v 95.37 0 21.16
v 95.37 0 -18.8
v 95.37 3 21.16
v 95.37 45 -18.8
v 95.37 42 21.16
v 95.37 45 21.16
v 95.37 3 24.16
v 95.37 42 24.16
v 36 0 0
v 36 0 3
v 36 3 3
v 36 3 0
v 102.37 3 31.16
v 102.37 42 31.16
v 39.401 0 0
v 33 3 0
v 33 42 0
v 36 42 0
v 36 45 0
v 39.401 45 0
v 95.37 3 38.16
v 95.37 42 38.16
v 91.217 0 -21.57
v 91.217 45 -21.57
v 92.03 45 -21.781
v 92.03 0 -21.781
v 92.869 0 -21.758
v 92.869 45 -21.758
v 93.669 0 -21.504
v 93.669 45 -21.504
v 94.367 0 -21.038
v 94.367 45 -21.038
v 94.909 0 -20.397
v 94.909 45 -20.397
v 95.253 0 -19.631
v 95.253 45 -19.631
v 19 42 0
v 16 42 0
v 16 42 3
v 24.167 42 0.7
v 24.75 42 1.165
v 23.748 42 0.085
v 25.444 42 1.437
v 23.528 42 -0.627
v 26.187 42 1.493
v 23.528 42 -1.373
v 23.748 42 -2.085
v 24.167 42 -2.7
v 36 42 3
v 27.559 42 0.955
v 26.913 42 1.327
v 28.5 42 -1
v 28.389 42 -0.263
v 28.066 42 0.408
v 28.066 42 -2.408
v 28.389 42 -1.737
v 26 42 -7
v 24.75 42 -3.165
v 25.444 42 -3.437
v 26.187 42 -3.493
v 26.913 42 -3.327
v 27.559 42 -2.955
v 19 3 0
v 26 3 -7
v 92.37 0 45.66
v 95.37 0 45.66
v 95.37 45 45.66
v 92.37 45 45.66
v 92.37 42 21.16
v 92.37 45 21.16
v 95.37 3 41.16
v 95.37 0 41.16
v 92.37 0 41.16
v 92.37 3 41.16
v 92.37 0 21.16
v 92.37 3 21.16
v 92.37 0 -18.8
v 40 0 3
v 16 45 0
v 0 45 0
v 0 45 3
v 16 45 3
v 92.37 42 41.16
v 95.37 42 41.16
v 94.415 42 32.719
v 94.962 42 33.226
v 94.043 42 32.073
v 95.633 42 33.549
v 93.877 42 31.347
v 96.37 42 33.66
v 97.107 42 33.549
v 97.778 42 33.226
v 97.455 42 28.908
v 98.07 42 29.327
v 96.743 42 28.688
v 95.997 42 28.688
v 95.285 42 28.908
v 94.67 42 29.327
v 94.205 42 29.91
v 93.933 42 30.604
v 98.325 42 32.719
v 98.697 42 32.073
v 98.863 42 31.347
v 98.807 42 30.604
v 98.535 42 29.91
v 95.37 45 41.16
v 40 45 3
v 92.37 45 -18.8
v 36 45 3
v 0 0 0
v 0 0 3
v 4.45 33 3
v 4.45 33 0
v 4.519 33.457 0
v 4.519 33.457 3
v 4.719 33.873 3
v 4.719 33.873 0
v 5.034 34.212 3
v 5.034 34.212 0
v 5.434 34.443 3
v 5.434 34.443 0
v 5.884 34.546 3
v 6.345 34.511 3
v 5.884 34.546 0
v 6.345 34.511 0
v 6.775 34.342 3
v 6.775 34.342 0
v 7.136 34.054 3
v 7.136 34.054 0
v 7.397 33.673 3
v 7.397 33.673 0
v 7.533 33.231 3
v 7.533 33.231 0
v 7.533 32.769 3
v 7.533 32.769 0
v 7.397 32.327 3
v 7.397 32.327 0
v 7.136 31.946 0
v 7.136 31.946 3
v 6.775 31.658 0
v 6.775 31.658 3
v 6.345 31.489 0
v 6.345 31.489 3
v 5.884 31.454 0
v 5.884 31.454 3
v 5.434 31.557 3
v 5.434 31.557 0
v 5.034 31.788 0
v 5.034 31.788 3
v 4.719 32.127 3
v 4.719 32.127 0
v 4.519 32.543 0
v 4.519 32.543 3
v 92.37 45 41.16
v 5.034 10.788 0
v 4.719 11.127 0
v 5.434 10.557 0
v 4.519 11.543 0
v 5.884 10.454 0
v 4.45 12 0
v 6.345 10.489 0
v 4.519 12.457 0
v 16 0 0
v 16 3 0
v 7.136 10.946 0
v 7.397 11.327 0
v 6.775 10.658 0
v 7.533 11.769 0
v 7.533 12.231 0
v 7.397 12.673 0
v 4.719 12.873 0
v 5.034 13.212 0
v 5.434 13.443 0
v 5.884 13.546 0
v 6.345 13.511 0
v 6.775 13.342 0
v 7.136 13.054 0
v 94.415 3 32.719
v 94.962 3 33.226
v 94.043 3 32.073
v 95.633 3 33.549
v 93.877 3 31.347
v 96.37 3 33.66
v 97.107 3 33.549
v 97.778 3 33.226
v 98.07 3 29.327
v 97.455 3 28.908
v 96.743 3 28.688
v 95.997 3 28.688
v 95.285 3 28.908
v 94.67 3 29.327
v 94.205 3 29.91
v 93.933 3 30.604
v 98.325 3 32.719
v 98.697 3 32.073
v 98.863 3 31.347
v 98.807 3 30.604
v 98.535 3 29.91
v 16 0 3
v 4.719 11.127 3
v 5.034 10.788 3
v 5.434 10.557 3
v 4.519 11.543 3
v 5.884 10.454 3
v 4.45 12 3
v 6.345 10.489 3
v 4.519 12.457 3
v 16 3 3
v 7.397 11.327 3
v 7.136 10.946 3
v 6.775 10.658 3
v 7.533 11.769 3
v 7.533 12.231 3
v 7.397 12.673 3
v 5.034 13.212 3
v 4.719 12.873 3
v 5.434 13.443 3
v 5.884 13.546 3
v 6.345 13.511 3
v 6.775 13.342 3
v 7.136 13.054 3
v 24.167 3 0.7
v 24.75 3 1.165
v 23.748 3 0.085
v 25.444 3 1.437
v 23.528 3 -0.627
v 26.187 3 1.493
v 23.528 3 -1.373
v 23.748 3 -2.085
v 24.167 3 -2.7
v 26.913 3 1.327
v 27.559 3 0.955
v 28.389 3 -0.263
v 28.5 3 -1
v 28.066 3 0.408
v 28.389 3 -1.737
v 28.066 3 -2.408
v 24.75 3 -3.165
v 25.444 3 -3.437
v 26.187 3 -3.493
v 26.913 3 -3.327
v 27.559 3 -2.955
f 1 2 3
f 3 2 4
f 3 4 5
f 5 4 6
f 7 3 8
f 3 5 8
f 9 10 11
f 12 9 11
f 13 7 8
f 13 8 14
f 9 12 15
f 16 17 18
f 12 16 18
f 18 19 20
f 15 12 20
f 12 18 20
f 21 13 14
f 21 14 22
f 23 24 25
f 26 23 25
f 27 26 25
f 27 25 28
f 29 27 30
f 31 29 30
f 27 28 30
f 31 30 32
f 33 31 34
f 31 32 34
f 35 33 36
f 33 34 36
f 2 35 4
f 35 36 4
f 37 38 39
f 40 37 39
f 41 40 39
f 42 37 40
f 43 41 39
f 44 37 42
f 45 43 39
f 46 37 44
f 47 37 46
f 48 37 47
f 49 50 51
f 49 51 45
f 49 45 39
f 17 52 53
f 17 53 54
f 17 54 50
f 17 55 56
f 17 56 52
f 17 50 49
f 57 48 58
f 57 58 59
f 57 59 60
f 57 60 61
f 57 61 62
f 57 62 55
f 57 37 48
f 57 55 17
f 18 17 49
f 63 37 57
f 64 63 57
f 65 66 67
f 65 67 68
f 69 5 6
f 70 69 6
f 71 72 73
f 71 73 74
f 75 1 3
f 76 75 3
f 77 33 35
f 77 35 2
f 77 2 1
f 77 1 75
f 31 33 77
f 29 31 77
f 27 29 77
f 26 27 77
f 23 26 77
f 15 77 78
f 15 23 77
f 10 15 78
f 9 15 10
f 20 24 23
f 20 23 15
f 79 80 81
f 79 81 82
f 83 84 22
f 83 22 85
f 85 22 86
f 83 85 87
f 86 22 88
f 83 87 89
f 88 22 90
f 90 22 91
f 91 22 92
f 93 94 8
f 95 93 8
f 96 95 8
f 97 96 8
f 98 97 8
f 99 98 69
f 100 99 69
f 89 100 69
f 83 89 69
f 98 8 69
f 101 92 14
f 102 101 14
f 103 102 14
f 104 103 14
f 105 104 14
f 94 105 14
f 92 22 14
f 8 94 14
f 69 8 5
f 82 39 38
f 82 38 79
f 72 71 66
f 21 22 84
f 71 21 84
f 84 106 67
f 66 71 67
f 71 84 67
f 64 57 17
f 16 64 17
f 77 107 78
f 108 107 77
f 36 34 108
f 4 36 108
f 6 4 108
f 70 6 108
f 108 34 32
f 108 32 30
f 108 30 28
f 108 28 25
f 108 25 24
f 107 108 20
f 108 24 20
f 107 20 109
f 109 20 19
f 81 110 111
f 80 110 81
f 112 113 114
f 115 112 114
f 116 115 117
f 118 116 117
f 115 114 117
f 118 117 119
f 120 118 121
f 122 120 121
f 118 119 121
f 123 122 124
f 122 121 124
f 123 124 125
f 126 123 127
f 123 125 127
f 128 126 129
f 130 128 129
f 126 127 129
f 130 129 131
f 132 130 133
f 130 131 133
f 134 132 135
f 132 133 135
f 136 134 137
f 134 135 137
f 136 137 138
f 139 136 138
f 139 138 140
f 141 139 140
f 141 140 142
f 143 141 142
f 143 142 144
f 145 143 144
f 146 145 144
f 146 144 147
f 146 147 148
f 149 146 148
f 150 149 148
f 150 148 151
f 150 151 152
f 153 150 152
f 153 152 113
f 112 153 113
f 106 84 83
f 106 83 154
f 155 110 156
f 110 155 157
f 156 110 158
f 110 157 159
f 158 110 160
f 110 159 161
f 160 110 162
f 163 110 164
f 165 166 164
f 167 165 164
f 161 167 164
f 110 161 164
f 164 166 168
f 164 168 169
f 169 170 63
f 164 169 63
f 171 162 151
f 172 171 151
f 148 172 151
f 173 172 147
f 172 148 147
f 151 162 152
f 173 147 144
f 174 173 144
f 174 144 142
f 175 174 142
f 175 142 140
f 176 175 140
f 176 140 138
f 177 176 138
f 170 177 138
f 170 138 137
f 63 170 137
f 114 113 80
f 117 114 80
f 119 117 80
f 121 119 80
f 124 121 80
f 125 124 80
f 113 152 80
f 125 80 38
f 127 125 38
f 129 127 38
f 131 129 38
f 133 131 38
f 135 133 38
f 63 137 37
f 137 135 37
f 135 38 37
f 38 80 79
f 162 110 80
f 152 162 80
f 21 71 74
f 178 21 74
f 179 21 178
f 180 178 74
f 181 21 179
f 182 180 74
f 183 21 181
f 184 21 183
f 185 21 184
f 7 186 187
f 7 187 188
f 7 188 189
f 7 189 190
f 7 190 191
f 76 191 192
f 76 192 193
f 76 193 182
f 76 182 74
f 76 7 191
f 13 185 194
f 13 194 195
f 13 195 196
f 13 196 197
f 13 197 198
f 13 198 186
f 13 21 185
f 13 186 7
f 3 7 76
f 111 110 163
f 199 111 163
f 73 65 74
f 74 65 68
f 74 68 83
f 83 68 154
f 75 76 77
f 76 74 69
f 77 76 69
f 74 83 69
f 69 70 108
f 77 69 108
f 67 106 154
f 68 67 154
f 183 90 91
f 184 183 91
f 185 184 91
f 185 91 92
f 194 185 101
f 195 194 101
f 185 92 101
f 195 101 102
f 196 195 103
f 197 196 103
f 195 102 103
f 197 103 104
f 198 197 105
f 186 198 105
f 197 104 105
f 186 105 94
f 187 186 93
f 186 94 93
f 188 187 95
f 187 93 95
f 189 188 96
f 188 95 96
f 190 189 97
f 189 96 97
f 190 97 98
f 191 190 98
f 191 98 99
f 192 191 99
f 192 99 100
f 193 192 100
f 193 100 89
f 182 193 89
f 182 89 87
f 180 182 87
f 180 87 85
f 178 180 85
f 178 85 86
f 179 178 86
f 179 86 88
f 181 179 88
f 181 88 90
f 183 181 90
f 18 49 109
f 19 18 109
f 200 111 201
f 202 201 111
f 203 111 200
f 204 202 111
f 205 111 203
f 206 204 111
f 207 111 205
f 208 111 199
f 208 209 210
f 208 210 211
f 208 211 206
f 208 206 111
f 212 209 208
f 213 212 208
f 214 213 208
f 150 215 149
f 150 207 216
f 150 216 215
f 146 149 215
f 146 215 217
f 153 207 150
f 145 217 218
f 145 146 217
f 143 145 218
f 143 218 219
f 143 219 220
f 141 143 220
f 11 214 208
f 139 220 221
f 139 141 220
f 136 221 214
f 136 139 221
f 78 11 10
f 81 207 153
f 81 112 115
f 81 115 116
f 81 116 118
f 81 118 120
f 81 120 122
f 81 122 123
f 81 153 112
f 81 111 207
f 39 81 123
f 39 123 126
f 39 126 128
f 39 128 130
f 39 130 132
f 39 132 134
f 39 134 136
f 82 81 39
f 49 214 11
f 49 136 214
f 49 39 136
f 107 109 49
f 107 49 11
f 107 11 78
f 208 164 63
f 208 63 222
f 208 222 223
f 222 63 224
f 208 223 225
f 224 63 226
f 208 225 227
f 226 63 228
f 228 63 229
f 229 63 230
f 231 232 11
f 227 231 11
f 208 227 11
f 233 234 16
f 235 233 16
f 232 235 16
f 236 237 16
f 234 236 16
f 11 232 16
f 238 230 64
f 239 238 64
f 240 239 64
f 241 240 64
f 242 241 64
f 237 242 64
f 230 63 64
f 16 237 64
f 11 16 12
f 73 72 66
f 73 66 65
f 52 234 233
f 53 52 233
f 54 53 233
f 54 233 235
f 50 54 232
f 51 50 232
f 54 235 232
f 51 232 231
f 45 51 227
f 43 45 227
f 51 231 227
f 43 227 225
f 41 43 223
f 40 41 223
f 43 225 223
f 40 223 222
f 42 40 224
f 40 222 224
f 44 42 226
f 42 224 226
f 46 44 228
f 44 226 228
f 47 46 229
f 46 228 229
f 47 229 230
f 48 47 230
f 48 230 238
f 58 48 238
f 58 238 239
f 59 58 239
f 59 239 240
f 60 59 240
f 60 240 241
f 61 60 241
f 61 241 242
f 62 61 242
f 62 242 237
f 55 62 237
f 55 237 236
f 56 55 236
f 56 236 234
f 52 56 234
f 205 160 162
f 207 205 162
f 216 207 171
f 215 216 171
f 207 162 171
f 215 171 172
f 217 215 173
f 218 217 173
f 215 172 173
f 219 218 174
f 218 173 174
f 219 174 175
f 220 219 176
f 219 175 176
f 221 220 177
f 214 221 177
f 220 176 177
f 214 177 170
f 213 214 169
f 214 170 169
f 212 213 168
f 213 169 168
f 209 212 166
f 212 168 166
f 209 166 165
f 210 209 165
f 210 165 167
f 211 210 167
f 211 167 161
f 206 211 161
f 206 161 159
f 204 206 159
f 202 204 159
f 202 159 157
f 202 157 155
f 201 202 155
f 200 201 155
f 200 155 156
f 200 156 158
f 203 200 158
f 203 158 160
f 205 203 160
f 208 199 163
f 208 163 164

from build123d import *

# Parameters (mm, degrees)
SKETCH_1_W          = 60
SKETCH_1_H          = 45
EXTRUDE_1_DEPTH     = 3
SKETCH_2_W          = 60
SKETCH_2_H          = 3
EXTRUDE_2_DEPTH     = 3
SKETCH_3_W          = 20
SKETCH_3_H          = 3
CUT_EXTRUDE_1_DEPTH = 3
EXTRUDE_START       = -39
EXTRUDE_3_DEPTH     = 39
SKETCH_5_R          = 2.5
CUT_EXTRUDE_2_DEPTH = 74.573092908
SKETCH_6_W          = 60
SKETCH_6_H          = 3
CUT_EXTRUDE_3_DEPTH = 74.573092908
SKETCH_8_W          = 20
SKETCH_8_H          = 3
CUT_EXTRUDE_4_DEPTH = 76.325958341
EXTRUDE_4_DEPTH     = 45
EXTRUDE_5_DEPTH     = 45
SKETCH_11_W         = 20
SKETCH_11_H         = 3
CUT_EXTRUDE_5_DEPTH = 3
EXTRUDE_6_DEPTH     = 39
SKETCH_14_R         = 2.5
CUT_EXTRUDE_7_DEPTH = 120.701514193
CUT_EXTRUDE_8_REACH = 122.787
SKETCH_16_R         = 1.55


with BuildPart() as part:
    # 草图1 → 凸台-拉伸1 (new body)
    with BuildSketch(Plane.XY):
        with Locations((30, 22.5)):
            Rectangle(SKETCH_1_W, SKETCH_1_H)
    extrude(amount=EXTRUDE_1_DEPTH)

    # 草图2 → 凸台-拉伸2 (add)
    with BuildSketch(Plane.XY.offset(3)):
        with Locations((30, 40.5)):
            Rectangle(SKETCH_2_W, SKETCH_2_H)
        with Locations((30, 4.5)):
            Rectangle(SKETCH_2_W, SKETCH_2_H)
    extrude(amount=EXTRUDE_2_DEPTH)

    # 草图3 → 切除-拉伸1 (cut)
    with BuildSketch(Plane.XY.offset(3)):
        with Locations((26, 1.5)):
            Rectangle(SKETCH_3_W, SKETCH_3_H)
        with Locations((26, 43.5)):
            Rectangle(SKETCH_3_W, SKETCH_3_H)
    extrude(amount=-CUT_EXTRUDE_1_DEPTH, mode=Mode.SUBTRACT)

    # 草图4 → 凸台-拉伸3 (add)
    with BuildSketch(Plane.XZ.offset(-3).offset(EXTRUDE_START)):
        Polygon((19, 0), (26, -7), (33, 0), align=None)
    extrude(amount=EXTRUDE_3_DEPTH)

    # 草图5 → 切除-拉伸2 (cut, through all)
    with BuildSketch(Plane.XZ.offset(-3)):
        with Locations((26, -1)):
            Circle(SKETCH_5_R)
    extrude(amount=-CUT_EXTRUDE_2_DEPTH, mode=Mode.SUBTRACT)

    # 草图6 → 切除-拉伸3 (cut, through all)
    with BuildSketch(Plane.XZ.offset(-3)):
        with Locations((30, 4.5)):
            Rectangle(SKETCH_6_W, SKETCH_6_H)
    extrude(amount=-CUT_EXTRUDE_3_DEPTH, mode=Mode.SUBTRACT)

    # 草图8 → 切除-拉伸4 (cut, through all)
    with BuildSketch(Plane.XZ):
        with Locations((50, 1.5)):
            Rectangle(SKETCH_8_W, SKETCH_8_H)
    extrude(amount=-CUT_EXTRUDE_4_DEPTH, mode=Mode.SUBTRACT)

    # 草图9 → 凸台-拉伸4 (add, through all)
    with BuildSketch(Plane(origin=(0, 45, 0), x_dir=(1, 0, 0), z_dir=(0, 1, 0))):
        Polygon((40, -3), (92.37, 18.8), (91.217092711, 21.569621776), (38.847092711, -0.230378224), align=None)
    extrude(amount=-EXTRUDE_4_DEPTH)

    # 草图10 → 凸台-拉伸5 (add, through all)
    with BuildSketch(Plane(origin=(0, 45, 0), x_dir=(1, 0, 0), z_dir=(0, 1, 0))):
        with BuildLine():
            Line((92.37, 18.8), (91.217092711, 21.569621776))
            ThreePointArc((91.217092711, 21.569621776), (94.034523676, 21.295868773), (95.37, 18.8))
            Line((95.37, 18.8), (95.37, -45.66))
            Line((95.37, -45.66), (92.37, -45.66))
            Line((92.37, -45.66), (92.37, 18.8))
        make_face()
    extrude(amount=-EXTRUDE_5_DEPTH)

    # 草图11 → 切除-拉伸5 (cut)
    with BuildSketch(Plane(origin=(95.37, 0, 0), x_dir=(0, 0, -1), z_dir=(1, 0, 0))):
        with Locations((-31.16, 1.5)):
            Rectangle(SKETCH_11_W, SKETCH_11_H)
        with Locations((-31.16, 43.5)):
            Rectangle(SKETCH_11_W, SKETCH_11_H)
    extrude(amount=-CUT_EXTRUDE_5_DEPTH, mode=Mode.SUBTRACT)

    # 草图12 → 凸台-拉伸6 (add)
    with BuildSketch(Plane(origin=(0, 42, 0), x_dir=(1, 0, 0), z_dir=(0, 1, 0)).offset(EXTRUDE_START)):
        Polygon((92.37, -21.16), (102.37, -31.16), (92.37, -41.16), align=None)
    extrude(amount=EXTRUDE_6_DEPTH)

    # 草图14 → 切除-拉伸7 (cut, through all)
    with BuildSketch(Plane(origin=(0, 42, 0), x_dir=(1, 0, 0), z_dir=(0, 1, 0))):
        with Locations(Location((96.37, -31.16, 0), (0, 0, 270))):
            Circle(SKETCH_14_R)
    extrude(amount=-CUT_EXTRUDE_7_DEPTH, mode=Mode.SUBTRACT)

    # 草图16 → 切除-拉伸8 (cut, up to next)
    with BuildSketch(Plane(origin=(0, 0, 0), x_dir=(-1, 0, 0), z_dir=(0, 0, -1)), mode=Mode.PRIVATE) as cut_extrude_8_sk1:
        with Locations((-6, 33)):
            Circle(SKETCH_16_R)
    cut_extrude_8_tool1 = extrude(cut_extrude_8_sk1.sketch, amount=-CUT_EXTRUDE_8_REACH, mode=Mode.PRIVATE) & part.part
    # 草图16 → 切除-拉伸8 (cut, up to next)
    with BuildSketch(Plane(origin=(0, 0, 0), x_dir=(-1, 0, 0), z_dir=(0, 0, -1)), mode=Mode.PRIVATE) as cut_extrude_8_sk2:
        with Locations((-6, 12)):
            Circle(SKETCH_16_R)
    cut_extrude_8_tool2 = extrude(cut_extrude_8_sk2.sketch, amount=-CUT_EXTRUDE_8_REACH, mode=Mode.PRIVATE) & part.part
    add(cut_extrude_8_tool1.solids().sort_by_distance((6, 33, 0))[0], mode=Mode.SUBTRACT)
    add(cut_extrude_8_tool2.solids().sort_by_distance((6, 12, 0))[0], mode=Mode.SUBTRACT)


solid = part.part
